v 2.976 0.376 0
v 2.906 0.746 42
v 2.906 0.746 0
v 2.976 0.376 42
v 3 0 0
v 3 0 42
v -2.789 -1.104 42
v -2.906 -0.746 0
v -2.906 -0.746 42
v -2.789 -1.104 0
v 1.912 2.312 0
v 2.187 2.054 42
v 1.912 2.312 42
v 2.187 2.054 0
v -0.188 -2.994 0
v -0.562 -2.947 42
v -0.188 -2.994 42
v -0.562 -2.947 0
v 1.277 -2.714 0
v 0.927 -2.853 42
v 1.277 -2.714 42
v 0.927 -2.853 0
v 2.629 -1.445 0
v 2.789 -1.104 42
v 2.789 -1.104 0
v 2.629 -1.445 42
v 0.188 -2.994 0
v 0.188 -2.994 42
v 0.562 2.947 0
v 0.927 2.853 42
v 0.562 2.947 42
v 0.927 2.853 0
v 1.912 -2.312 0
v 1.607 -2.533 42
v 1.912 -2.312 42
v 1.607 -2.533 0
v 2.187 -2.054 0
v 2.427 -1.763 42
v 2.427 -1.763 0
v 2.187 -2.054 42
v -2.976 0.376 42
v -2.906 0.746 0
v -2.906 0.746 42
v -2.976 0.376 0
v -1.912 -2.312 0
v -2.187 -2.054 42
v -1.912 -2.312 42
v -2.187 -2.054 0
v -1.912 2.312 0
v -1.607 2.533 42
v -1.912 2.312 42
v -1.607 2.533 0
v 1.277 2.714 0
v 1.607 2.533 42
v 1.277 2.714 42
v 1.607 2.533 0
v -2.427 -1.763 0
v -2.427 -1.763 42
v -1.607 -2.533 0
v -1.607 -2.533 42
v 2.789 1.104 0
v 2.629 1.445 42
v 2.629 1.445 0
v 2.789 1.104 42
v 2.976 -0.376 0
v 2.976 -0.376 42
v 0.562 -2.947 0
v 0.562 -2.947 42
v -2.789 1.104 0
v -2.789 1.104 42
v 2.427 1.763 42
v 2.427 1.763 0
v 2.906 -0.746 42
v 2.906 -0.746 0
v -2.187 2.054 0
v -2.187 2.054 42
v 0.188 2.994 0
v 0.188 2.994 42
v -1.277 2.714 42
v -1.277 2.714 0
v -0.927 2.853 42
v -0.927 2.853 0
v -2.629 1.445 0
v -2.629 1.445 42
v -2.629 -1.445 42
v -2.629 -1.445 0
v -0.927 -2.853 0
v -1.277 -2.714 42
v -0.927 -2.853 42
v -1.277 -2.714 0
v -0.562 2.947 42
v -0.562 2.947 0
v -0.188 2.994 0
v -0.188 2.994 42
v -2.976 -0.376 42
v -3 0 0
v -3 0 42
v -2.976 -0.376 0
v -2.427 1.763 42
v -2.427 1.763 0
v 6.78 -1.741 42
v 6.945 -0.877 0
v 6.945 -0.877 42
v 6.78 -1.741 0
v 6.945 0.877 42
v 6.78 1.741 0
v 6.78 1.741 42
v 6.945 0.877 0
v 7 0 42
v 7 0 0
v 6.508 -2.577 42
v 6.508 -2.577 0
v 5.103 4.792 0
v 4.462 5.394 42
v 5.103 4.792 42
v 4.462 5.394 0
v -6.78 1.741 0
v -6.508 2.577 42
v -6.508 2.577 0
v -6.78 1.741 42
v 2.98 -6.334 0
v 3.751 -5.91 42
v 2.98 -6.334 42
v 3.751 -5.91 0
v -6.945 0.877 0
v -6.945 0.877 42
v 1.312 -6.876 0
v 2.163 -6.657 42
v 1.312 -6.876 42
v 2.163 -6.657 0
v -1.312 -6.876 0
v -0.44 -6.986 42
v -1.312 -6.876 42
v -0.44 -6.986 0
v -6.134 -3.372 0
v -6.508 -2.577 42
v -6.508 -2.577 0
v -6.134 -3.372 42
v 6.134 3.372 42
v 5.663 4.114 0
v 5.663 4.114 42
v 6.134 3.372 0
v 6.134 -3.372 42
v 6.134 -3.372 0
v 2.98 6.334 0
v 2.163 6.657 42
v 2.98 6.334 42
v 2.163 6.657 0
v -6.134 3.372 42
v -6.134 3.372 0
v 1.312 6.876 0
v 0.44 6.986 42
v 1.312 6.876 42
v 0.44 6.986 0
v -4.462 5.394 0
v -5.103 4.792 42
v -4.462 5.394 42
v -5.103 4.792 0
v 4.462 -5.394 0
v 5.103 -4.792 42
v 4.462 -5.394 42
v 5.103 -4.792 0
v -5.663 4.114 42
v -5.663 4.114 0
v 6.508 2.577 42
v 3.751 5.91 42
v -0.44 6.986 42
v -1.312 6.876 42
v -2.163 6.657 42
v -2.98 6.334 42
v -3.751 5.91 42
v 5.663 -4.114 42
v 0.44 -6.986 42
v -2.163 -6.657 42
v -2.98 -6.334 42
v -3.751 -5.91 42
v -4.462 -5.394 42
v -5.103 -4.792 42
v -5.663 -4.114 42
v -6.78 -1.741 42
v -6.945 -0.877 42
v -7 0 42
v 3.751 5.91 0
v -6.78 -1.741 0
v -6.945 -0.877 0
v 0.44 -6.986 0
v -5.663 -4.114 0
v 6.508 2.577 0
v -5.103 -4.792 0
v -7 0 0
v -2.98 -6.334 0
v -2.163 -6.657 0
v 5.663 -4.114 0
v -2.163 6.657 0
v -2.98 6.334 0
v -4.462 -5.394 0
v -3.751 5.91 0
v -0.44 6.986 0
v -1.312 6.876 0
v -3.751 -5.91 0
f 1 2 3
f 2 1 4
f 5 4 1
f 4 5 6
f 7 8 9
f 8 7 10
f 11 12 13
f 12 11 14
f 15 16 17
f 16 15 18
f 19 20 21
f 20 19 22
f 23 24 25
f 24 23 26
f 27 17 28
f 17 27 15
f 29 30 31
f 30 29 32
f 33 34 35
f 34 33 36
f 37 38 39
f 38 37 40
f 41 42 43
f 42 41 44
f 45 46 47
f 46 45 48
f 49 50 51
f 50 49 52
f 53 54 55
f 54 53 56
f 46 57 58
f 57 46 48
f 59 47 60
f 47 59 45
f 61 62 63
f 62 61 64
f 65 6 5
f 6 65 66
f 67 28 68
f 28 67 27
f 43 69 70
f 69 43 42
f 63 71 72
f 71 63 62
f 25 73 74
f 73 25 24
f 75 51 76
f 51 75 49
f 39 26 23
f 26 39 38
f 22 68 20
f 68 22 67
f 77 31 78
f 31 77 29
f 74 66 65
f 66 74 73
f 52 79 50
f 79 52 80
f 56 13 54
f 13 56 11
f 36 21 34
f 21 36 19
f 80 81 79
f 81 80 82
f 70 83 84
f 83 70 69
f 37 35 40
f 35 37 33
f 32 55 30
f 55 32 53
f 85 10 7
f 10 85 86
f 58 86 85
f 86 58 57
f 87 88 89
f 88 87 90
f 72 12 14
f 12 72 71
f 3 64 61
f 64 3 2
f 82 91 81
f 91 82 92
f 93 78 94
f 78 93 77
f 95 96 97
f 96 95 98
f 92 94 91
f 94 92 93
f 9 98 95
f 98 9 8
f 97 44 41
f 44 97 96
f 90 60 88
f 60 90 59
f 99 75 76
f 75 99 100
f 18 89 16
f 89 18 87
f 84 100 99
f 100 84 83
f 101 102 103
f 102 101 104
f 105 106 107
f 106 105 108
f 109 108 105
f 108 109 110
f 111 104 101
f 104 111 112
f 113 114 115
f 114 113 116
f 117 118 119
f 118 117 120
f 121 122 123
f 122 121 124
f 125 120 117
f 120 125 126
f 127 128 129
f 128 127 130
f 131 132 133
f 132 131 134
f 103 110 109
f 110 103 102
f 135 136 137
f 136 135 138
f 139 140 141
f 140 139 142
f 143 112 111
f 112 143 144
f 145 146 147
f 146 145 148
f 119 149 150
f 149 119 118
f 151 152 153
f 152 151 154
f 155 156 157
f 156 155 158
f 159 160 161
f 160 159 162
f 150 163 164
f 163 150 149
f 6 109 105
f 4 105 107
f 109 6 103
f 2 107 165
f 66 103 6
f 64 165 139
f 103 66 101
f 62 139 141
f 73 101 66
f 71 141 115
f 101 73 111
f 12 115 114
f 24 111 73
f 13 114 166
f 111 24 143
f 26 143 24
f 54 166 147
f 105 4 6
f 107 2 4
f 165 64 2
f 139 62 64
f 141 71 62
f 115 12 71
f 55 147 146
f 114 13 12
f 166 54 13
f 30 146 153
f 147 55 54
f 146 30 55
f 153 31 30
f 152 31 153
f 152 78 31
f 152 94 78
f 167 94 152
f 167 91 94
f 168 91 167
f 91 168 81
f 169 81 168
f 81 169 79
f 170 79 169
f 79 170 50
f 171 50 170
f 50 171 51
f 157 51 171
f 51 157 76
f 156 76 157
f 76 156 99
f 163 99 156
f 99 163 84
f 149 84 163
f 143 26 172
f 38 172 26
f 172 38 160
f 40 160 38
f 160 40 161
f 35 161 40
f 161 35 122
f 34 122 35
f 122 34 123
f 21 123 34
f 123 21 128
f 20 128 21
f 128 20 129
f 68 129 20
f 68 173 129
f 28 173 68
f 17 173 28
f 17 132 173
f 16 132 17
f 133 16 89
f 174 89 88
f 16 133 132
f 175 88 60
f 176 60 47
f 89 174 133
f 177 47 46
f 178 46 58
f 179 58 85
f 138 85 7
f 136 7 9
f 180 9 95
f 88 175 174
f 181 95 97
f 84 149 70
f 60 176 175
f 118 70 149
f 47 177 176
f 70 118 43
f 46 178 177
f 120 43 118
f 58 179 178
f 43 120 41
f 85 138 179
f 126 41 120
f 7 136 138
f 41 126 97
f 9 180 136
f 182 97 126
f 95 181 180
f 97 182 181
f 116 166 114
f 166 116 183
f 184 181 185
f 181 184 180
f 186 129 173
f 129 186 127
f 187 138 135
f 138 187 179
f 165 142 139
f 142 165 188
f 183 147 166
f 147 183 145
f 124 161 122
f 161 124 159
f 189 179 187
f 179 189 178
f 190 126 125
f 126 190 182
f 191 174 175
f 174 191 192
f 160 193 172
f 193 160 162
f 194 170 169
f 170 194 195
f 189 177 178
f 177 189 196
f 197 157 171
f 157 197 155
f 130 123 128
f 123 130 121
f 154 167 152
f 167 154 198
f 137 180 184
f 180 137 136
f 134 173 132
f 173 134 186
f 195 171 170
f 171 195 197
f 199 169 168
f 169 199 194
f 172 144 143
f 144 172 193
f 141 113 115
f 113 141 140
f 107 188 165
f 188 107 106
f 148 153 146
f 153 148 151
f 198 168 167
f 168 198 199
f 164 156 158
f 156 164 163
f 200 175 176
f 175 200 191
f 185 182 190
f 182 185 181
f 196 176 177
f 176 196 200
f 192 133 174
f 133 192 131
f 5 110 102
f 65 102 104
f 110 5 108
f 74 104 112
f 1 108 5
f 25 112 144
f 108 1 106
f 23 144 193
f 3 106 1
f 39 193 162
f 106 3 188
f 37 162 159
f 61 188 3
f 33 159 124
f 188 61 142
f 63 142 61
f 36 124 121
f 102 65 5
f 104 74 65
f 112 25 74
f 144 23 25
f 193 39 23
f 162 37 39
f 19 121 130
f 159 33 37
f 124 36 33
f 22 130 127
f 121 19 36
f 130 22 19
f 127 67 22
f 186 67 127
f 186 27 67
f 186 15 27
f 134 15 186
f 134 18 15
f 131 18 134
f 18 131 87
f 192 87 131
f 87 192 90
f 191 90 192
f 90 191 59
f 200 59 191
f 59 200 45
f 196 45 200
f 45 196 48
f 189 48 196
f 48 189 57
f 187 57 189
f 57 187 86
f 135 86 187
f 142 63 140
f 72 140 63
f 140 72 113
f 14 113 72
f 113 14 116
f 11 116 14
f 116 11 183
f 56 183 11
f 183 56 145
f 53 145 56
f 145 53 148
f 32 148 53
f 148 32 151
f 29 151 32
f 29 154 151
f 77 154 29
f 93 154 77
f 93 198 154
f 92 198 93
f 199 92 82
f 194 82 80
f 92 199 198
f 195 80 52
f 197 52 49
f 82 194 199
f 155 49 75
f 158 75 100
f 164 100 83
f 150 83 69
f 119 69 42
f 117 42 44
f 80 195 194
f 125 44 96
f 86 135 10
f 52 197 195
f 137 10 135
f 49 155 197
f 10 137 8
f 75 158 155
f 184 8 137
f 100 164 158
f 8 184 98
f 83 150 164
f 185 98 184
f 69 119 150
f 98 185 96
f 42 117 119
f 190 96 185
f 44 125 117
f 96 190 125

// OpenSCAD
$fn = 50;


difference() {
	union() {
		cylinder(h = 42, r = 7.0000000000);
	}
	union() {
		translate(v = [0, 0, -100]) {
			cylinder(h = 200, r = 3.0000000000);
		}
		translate(v = [0, 0, -100]) {
			cylinder(h = 200, r = 1.5000000000);
		}
	}
}
